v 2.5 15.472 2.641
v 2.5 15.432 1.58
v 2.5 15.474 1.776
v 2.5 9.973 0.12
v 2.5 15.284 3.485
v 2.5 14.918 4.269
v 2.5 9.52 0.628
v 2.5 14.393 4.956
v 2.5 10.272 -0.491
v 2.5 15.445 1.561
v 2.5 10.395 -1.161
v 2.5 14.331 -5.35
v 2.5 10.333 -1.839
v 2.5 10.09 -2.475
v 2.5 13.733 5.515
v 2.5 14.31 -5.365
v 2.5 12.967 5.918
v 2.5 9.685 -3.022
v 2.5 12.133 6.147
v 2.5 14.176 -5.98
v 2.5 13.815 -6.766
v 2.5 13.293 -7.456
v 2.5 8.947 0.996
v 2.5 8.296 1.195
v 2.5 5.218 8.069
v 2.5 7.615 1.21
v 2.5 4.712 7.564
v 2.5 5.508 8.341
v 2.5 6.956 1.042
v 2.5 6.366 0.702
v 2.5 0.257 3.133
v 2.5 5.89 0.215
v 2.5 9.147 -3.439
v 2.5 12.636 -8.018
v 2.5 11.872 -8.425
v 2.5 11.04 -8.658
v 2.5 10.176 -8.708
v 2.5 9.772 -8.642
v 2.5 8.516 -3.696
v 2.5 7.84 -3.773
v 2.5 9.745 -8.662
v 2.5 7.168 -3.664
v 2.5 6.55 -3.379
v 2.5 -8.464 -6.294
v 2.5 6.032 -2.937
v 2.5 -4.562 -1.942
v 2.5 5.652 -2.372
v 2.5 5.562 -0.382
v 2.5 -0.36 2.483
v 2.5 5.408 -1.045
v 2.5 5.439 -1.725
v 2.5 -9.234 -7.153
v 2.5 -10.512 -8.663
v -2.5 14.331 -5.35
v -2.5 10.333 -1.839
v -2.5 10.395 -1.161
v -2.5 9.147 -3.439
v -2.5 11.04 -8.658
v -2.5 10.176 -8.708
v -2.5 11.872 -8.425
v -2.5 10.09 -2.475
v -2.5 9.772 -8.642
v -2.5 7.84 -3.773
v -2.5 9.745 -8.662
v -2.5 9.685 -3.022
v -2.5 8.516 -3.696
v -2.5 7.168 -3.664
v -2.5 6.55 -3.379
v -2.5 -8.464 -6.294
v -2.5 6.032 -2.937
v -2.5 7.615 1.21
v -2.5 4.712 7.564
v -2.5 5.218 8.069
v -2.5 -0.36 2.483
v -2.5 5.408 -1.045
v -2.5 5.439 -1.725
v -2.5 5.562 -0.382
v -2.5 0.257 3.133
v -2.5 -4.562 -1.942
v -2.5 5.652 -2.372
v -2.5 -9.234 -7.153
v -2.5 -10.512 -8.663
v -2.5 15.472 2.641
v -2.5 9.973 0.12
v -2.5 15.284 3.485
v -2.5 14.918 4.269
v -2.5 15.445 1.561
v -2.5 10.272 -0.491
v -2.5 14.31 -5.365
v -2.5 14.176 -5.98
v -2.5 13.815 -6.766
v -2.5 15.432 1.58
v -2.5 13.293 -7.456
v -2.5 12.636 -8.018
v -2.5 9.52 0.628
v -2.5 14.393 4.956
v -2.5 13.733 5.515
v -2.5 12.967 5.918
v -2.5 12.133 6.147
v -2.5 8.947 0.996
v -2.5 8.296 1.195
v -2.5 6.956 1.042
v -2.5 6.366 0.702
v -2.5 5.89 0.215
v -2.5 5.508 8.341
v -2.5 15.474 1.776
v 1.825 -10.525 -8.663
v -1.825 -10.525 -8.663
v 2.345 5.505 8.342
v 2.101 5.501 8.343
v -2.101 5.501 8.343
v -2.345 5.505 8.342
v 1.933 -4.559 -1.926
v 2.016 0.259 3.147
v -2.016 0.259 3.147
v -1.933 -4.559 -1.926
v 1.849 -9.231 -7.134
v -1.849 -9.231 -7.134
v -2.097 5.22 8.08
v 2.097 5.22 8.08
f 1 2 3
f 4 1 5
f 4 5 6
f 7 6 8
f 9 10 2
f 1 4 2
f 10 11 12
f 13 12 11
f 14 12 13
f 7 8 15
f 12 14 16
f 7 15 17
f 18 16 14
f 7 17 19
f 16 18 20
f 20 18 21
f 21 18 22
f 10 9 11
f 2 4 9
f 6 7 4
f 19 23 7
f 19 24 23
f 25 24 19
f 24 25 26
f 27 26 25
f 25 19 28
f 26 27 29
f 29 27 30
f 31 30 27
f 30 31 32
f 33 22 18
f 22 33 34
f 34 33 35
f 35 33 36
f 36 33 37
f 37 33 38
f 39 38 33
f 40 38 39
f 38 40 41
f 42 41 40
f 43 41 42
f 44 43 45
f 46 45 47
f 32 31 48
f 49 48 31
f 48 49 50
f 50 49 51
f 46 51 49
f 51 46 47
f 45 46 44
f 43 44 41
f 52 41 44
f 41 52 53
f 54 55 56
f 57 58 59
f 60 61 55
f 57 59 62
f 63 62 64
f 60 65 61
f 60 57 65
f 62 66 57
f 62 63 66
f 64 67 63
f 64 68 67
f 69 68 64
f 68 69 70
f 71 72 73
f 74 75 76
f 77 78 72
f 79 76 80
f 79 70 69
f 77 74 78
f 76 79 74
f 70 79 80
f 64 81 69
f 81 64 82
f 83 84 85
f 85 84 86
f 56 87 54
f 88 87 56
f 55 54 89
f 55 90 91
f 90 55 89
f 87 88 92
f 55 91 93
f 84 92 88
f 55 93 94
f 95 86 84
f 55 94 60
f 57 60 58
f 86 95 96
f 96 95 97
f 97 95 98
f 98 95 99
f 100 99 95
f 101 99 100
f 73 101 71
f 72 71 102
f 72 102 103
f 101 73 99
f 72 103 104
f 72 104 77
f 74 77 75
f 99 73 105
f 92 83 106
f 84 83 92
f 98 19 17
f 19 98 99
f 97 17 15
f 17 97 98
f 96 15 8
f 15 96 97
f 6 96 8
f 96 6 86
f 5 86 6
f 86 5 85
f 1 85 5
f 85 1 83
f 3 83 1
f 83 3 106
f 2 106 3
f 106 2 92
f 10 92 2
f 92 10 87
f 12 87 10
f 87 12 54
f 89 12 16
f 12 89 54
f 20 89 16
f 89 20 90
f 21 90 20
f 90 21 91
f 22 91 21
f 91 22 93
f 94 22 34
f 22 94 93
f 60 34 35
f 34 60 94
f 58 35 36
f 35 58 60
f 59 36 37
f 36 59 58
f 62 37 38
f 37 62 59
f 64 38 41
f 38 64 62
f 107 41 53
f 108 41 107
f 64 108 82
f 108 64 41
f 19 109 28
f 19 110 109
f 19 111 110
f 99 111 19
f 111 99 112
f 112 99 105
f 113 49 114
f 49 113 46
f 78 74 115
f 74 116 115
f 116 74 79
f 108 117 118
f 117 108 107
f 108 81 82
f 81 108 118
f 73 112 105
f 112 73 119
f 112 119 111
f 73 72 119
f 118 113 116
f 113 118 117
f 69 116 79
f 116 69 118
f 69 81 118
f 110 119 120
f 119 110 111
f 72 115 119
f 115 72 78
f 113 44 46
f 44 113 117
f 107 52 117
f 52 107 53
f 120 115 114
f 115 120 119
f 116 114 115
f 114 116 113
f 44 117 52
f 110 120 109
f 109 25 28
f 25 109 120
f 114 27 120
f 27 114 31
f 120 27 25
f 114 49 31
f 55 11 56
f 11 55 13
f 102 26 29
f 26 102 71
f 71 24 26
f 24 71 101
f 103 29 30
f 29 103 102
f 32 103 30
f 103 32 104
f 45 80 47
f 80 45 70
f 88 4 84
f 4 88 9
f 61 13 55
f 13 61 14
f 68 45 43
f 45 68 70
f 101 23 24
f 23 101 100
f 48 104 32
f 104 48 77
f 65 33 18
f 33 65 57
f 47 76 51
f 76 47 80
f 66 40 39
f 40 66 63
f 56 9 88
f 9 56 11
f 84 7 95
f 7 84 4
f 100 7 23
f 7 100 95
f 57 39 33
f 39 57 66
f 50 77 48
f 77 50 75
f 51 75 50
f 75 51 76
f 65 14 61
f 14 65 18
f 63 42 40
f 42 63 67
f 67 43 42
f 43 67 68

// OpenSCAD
// file: ../motors/MN5212.scad
use <../utils.scad>

module MN5212(){

	//render(){
		difference(){
			union(){
				translate([0,0, 42.5 / 2 - 23 / 2 - 4.9 - 6])
					cylinder(
						h = 23,
						r = 59 / 2,
						$fa = fa(59 / 2),
						center = true);
				translate([0,0, 42.5 / 2 - 4.9 / 2 - 6])
					cylinder(
						h = 4.9,
						r1 = 59 / 2,
						r2 = 24.8 / 2,
						$fa = fa(59 / 2),
						center = true);
				translate([0,0, - 42.5 / 2 + 5.6 / 2 + 3])
					cylinder(
						h = 5.6,
						r1 = 44 / 2,
						r2 = 59 / 2,
						$fa = fa(59 / 2),
						center = true);
				translate([0, 0, 42.5 / 2 - 3])
					cylinder(
						h = 6,
						r = 4 / 2,
						$fa = fa(4 / 2),
						center = true);
				translate([0, 0, - 42.5 / 2 + 1.5])
					cylinder(
						h = 3,
						r = 6 / 2,
						$fa = fa(6 / 2),
						center = true);
			}
			union(){
				for(i = [0:90:270])
					rotate([0, 0, i])
						translate([0, 25 / 2, -16.25 - 0.025])
							cylinder(
								h = 4,
								r = 3 / 2,
								$fa = fa(3 / 2),
								center = true);
				for(i = [0:120:240])
					rotate([0, 0, i])
						translate([0, 17 / 2, 12.75 + 0.025])
							cylinder(
								h = 5,
								r = 3 / 2,
								$fa = fa(3 / 2),
								center = true);
				rotate([0, 0, 30])
					translate([0, 12 / 2, 12.75 + 0.025])
						cylinder(
							h = 5,
							r = 3 / 2,
							$fa = fa(3 / 2),
							center = true);
				rotate([0, 0, 30 + 180])
					translate([0, 12 / 2, 12.75 + 0.025])
						cylinder(
							h = 5,
							r = 3 / 2,
							$fa = fa(3 / 2),
							center = true);
			}
		}

	//}

}

MN5212();
// file: ../servos/TGY_4805_2PA.scad
use <../utils.scad>

module TGY_4805_2PA(){

	length = 40;
	width = 20;
	depth = 36.4;
	wing_width = 58;
	wing_thick = 2.45;
	wing_height = 27.7;
	shaft_offset = 9.5;
	hole_seperation = 9.2;
	hole_spacing = 50;
	shaft_height = 40;
	shaft_length = 3.6;
	hole_diameter = 4.8;

	module mounting_hole(){
		mh_rad = hole_diameter / 2;
		translate(
			[
				hole_spacing / 2,
				0,
				-depth / 2 + wing_height - wing_thick / 2
			])
			cylinder(h = 5, r = mh_rad, $fa = fa(mh_rad), center = true);
	}

	difference(){
		union(){
			cube([length, width, depth], center = true);
			translate([0, 0, -depth / 2 + wing_height - wing_thick / 2])
				cube([wing_width, width, wing_thick], center = true);
			translate(
				[
					- length / 2 + shaft_offset,
					0,
					shaft_height - length / 2 + shaft_length / 2
				])
				cylinder(
					h = shaft_length,
					r = 1.5,
					$fa = fa(1.5),
					center = true);
		}	union(){

			translate([0, hole_seperation / 2, 0]){
				mounting_hole();
				mirror() mounting_hole();
			}
			translate([0, -hole_seperation / 2, 0]){
				mounting_hole();
				mirror() mounting_hole();
			}
		}
	}
}

module TGY_4805_2PA_translate(){
	length = 40;
	shaft_offset = 9.5;
	shaft_height = 40;
	shaft_length = 3.6;
	translate(
		[
				- length / 2 + shaft_offset,
				0,
				shaft_height - length / 2 + shaft_length / 2
		]) children();
}

TGY_4805_2PA();
// file: ../servos/HS_5065MG.scad
use <../utils.scad>

module HS_5065MG(){

	length = 23.75;
	width = 11.68;
	depth = 20.32;
	wing_width = 32.38;
	wing_thick = 2;
	wing_offset = 1;
	shaft_offset = 6;
	hole_spacing = 28.32;
	hole_spacing_2 = 27;
	hole_2_wide = 6;
	hole_diameter = 2;
	shaft_height = 26.16;
	shaft_length = 2;

	module mounting_hole(){
		mh_rad = hole_diameter / 2;
		translate(
			[
				hole_spacing / 2,
				0,
				depth / 2 - wing_thick / 2
			])
			cylinder(h = 5, r = mh_rad, $fa = fa(mh_rad), center = true);
		translate(
			[
				hole_spacing_2 / 2,
				hole_2_wide / 2,
				depth / 2 - wing_thick / 2
			])
			cylinder(h = 5, r = mh_rad, $fa = fa(mh_rad), center = true);
		translate(
			[
				hole_spacing_2 / 2,
				- hole_2_wide / 2,
				depth / 2 - wing_thick / 2
			])
			cylinder(h = 5, r = mh_rad, $fa = fa(mh_rad), center = true);
	}

	difference(){
		union(){
			cube([length, width, depth], center = true);
			translate([0, 0, depth / 2 - wing_thick / 2 - wing_offset])
				cube([wing_width, width, wing_thick], center = true);
			translate(
				[
					- length / 2 + shaft_offset,
					0,
					depth / 2 + 3.8 + 1.9 + shaft_length / 2
				])
				cylinder(
					h = shaft_length,
					r = 1.5,
					$fa = fa(1.5),
					center = true);
			translate(
				[
					- length / 2 + shaft_offset,
					0,
					depth / 2 + 3.8 / 2
				])
				cylinder(
					h = 3.8,
					r = 11.3 / 2,
					$fa = fa(11.3 / 2),
					center = true);
			translate(
				[
					- length / 2 + shaft_offset,
					0,
					depth / 2 + 3.8 + 1.9 / 2
				])
				cylinder(
					h = 1.9,
					r1 = 11.3 / 2,
					r2 = 8 / 2,
					$fa = fa(11.3 / 2),
					center = true);
		}	union(){

			mounting_hole();
			mirror() mounting_hole();
		}
	}
}

module HS_5065MG_arm(){

	hole_size = 1.5;
	hole_spacing = 3;
	hole_offset = 9.6;

	difference(){
		union(){
			translate([0, 0, 4.4 / 2])
				cylinder(
					h = 4.4,
					r = 8 / 2,
					$fa = fa(8 / 2),
					center = true);
			hull(){
				translate([0, 0, 4.4 - 1.8 / 2])
					cylinder(
						h = 1.8,
						r = 8 / 2,
						$fa = fa(8 / 2),
						center = true);
				translate([18.8, 0, 4.4 - 1.8 / 2])
					cylinder(
						h = 1.8,
						r = 5 / 2,
						$fa = fa(5 / 2),
						center = true);
			}
		}
		union(){
			for(i = [0:3]){
				translate([hole_offset + hole_spacing * i, 0, 4.4 - 1.8 / 2])
					cylinder(
						h = 5,
						r = hole_size / 2,
						$fa = fa(hole_size / 2),
						center = true);
			}
		}
	}
}

module HS_5065MG_shaft_translate(){
	translate(
		[
			- 23.75 / 2 + 6,
			0,
			20.32 / 2 + 3.8 + 1.9
		])
			children();
}

HS_5065MG();
HS_5065MG_shaft_translate() HS_5065MG_arm();
// file: ../servos/LS_0006_servo.scad
// Author Michael Marques (DrYerzinia)

use <../utils.scad>

module ls_0006_servo(){
	
	length = 21.4;
	depth = 19.9;
	thickness = 11.65;

	gear_height = 2.6;
	gear_bump_height = 0.7;
	gear_bump_diameter = 1.97;
	gear_outer_bump_diameter = 6;
	gear_bump_offset = 12.2;

	shaft_height = 2.4;
	shaft_diameter = 3.74;
	shaft_offset = thickness / 2;
	shaft_screw_diameter = 1.3;
	
	wing_outer_width = 8.5;
	wing_top_off = 3.8;
	wing_length = 3.8;
	wing_thickness = 1.2;
	wing_hole_diameter = 1.85;
	wing_hole_edge_dist = 2;

	module wing_hole(){
		translate(
			[
				length / 2 + wing_hole_edge_dist,
				0,
				depth/2 - wing_top_off - wing_thickness / 2
			])
			cylinder(
				h = wing_thickness + 1,
				r = wing_hole_diameter / 2,
				$fn = 16,
				center = true);
	}

	module wing(){
		translate(
			[
				length / 2,
				thickness / 2,
				depth/2 - wing_top_off - wing_thickness
			])
			rotate([0,0,-90])
				trapezoid(
					thickness,
					wing_outer_width,
					wing_length,
					wing_thickness);
	}

	// Body
	cube([length, thickness, depth], center = true);

	difference(){
		union(){

			wing();
			mirror() wing();

			// Gear Bumps
			translate([0, 0, depth/2 + gear_height / 2]){
				translate([length / 2 - gear_bump_offset, 0, 0])
					cylinder(
						h = gear_height,
						r = gear_outer_bump_diameter / 2,
						$fn = 16,
						center = true);
				translate([length / 2 - gear_bump_offset, 0, gear_height/2 + gear_bump_height / 2])
					cylinder(
						h = gear_bump_height,
						r = gear_bump_diameter / 2,
						$fn = 16,
						center = true);
				translate([length / 2 - shaft_offset, 0, 0])
					cylinder(
						h = gear_height,
						r = thickness / 2,
						$fn = 32,
						center = true);
				// Shaft
				translate([length / 2 - shaft_offset, 0, gear_height])
					cylinder(
						h = shaft_height,
						r = shaft_diameter / 2,
						$fn = 16,
						center = true);
			}

		}
		union(){

			wing_hole();
			mirror() wing_hole();

			// Shaft_hole
			translate(
				[
					length / 2 - shaft_offset,
					0,
					depth/2 + gear_height * (3 / 2) + 0.5])
				cylinder(
					h = shaft_height + 1,
					r = shaft_screw_diameter / 2,
					$fn = 16,
					center = true);

		}
	}

}

module translate_ls_0006_attachment(){

	length = 21.4;
	thickness = 11.65;
	shaft_offset = thickness / 2;
	depth = 19.9;
	float = 3.3;

	translate([length / 2 - shaft_offset, 0, depth / 2 + float])
		children();

}

module bar_attachment(){

	height = 3.75;
	bar_length = 14.7;
	bar_thickness = 1.6;
	inner_radius = 5.9;
	outer_radius = 3.95;
	shaft_diameter = 3.7;
	upper_void_diameter = 4.8;
	screw_diameter = 2;
	hole_spacing = 2;
	hole_4_diameter = 1.2;
	hole_diameter = 1;
	hole_start_off = 4.7;
	top_void_depth = 0.67;
	bottom_void_depth = 1.84;

	translate([0, 0, height / 2]){
		difference(){
			union(){

				translate([0, inner_radius / 2, height / 2 - bar_thickness])
					rotate([0,0,-90])
						trapezoid(
							inner_radius,
							outer_radius,
							bar_length,
							bar_thickness);

				cylinder(
					h = height,
					r = inner_radius / 2,
					$fn = 16,
					center = true);

				translate([bar_length, 0, height / 2 - bar_thickness / 2])
					cylinder(
						h = bar_thickness,
						r = outer_radius / 2,
						$fn = 16,
						center = true);

			}
			union(){
				// screwhole
				cylinder(
					h = height + 1,
					r = screw_diameter / 2,
					$fn = 16,
					center = true);
				// voids
				translate([0, 0, height / 2 - top_void_depth / 2 + 0.5])
					cylinder(
						h = top_void_depth + 1,
						r = upper_void_diameter / 2,
						$fn = 16,
						center = true);
				translate([0, 0,  - bottom_void_depth / 2 - 0.5])
					cylinder(
						h = bottom_void_depth + 1,
						r = shaft_diameter / 2,
						$fn = 16,
						center = true);

				for(i = [0:4]){
					dia = (i != 3) ? hole_diameter : hole_4_diameter;
					translate(
						[
							hole_start_off + hole_spacing * i,
							0,
							height / 2 - bar_thickness / 2])
						cylinder(
							h = bar_thickness + 1,
							r = dia / 2,
							$fn = 16,
							center = true);
				}

			}
		}
	}

}

ls_0006_servo();
translate_ls_0006_attachment() bar_attachment();
// file: ../servos/parallax_continuous_rotation_servo.scad
// Author Michael Marques (DrYerzinia)

module parallax_continuous_rotation_servo(){

	depth = 37.7;
	length = 40.75;
	width = 19.75;

	mount_height = 2.7;
	mount_extent = 6.1;
	mount_from_top = 7.7;

	mount_hole_diameter = 4.46;
	mount_hole_spacing = 14.4 - mount_hole_diameter;

	shaft_diameter = 5.8;
	shaft_offset = 10;
	shaft_length = 3.5;

	module mounting_hole(){

			translate(
				[
					length / 2 + 5,
					mount_hole_spacing / 2,
					depth / 2 - mount_height / 2 - mount_from_top
				]
				)
				cylinder(
					h = mount_height + 1,
					r = mount_hole_diameter / 2,
					$fn=16,
					center = true);
	}

	difference(){
		union(){

			// Body
			cube([length,width,depth], center = true);

			// Mounting wings
			translate(
				[
					0,
					0,
					depth / 2 - mount_height / 2 - mount_from_top
				])
				cube(
					[
						length + mount_extent * 2,
						width,
						mount_height
					],
					center = true);

			// Shaft
			translate(
				[
					length / 2 - shaft_offset,
					0,
					depth / 2 + shaft_length / 2
				]
				)
				cylinder(
					h = shaft_length,
					r = shaft_diameter / 2,
					$fn = 16,
					center = true
				);

		}
		union(){

			// Mounting Holes
			mounting_hole();
			mirror()
				mounting_hole();

			translate([0,-mount_hole_spacing,0]){
				mounting_hole();
				mirror()
					mounting_hole();
			}
		}
	}

}

module translate_shaft(){

	depth = 37.7;
	length = 40.75;

	shaft_offset = 10;

	translate(
		[
			length / 2 - shaft_offset,
			0,
			depth / 2
		])
		children();
}

module round_servo_attachment(){

	height = 6;
	diameter = 20.8;
	inner_diameter = 8.6;
	plate_thickness = 2.45;

	float = 2;

	depth = 37.7;
	length = 40.75;

	shaft_offset = 10;

	plate_hole_spacing = 14.5;
	plate_hole_diameter = 1.4;
	plate_hole_minor_spacing = 3.5;

	screw_hole_diameter = 3;

	inner_diameter = 8;
	
	top_depth = 1.8;
	bottom_depth = 3.4;

	void_diameter = 5.8;

	module plate_hole(){
		cylinder(
			h = plate_thickness + 1,
			r = plate_hole_diameter / 2,
			$fn = 16,
			center = true
		);
	}

	module plate_hole_group(){
		translate([0, 0, height / 2 - plate_thickness / 2]){
			translate([0, plate_hole_spacing / 2, 0]){
					plate_hole();
					translate([- plate_hole_minor_spacing, 0, 0])
						plate_hole();
					translate([  plate_hole_minor_spacing, 0, 0])
						plate_hole();
			}
		}
	}

	translate(
		[
			length / 2 - shaft_offset,
			0,
			depth / 2 + height / 2 + float
		]
		)
		difference(){

			union(){

				// inner shaft
				cylinder(
					h = height,
					r = inner_diameter / 2,
					$fn = 16,
					center = true
				);

				// top
				translate([0, 0, height / 2 - plate_thickness / 2])
					cylinder(
						h = plate_thickness,
						r = diameter / 2,
						$fn = 32,
						center = true
					);
			}

			union(){

				// plate holes
				for(ang = [0:3]){
					rotate([0,0, ang * 90])
						plate_hole_group();
				}

				// screw hole
				cylinder(
					h = height + 1,
					r = screw_hole_diameter / 2,
					$fn = 16,
					center = true
				);

				// inner voids
				translate([0, 0, height / 2 - top_depth / 2 + 1])
					cylinder(
						h = top_depth + 1,
						r = void_diameter / 2,
						$fn = 16,
						center = true
					);
				translate([0, 0, -1])
					cylinder(
						h = bottom_depth + 1,
						r = void_diameter / 2,
						$fn = 16,
						center = true
					);

			}

		}

}

parallax_continuous_rotation_servo();
round_servo_attachment();
// file: ../hardware.scad
 // Author Michael Marques (DrYerzinia)

// http://www.ebay.com/itm/10-PCS-683-3x7x2-mm-Metal-OPEN-PRECISION-Miniature-Ball-Bearing-3-7-2-/291206307942?hash=item43cd3fa066:m:mCi6eovrGVk_CjIUjlhw8yg
// E-Bay empire.rc

module washer_M3_7x3_2x0_5mm(){

	difference(){
		cylinder(
			h = 0.5,
			r = 7 / 2,
			$fn = 16,
			center = true);
		cylinder(
			h = 0.5 + 0.1,
			r = 3.2 / 2,
			$fn = 16,
			center = true);
	}

}

module bearing_3x7x2mm(){

	difference(){
		cylinder(
			h = 2,
			r = 7 / 2,
			$fn = 16,
			center = true);
		cylinder(
			h = 2 + 1,
			r = 3 / 2,
			$fn = 16,
			center = true);
	}

}

module bearing_5x8x2_5mm(){

	difference(){
		cylinder(
			h = 2.5,
			r = 8 / 2,
			$fn = 16,
			center = true);
		cylinder(
			h = 2.5 + 1,
			r = 5 / 2,
			$fn = 16,
			center = true);
	}

}

module bearing_8x16x5mm(){

	difference(){
		cylinder(
			h = 5,
			r = 16 / 2,
			$fn = 16,
			center = true);
		cylinder(
			h = 5 + 1,
			r = 8 / 2,
			$fn = 16,
			center = true);
	}

}


bearing_5x8x2_5mm();
// file: ../utils.scad
// http://forum.openscad.org/Creating-pie-pizza-slice-shape-need-a-dynamic-length-array-td3148.html

module pie_slice(r, start_angle, end_angle) {
    R = r * sqrt(2) + 1;
    a0 = (4 * start_angle + 0 * end_angle) / 4;
    a1 = (3 * start_angle + 1 * end_angle) / 4;
    a2 = (2 * start_angle + 2 * end_angle) / 4;
    a3 = (1 * start_angle + 3 * end_angle) / 4;
    a4 = (0 * start_angle + 4 * end_angle) / 4;
    if(end_angle > start_angle)
        intersection() {
        circle(r, $fa = fa(r));
        polygon([
            [0,0],
            [R * cos(a0), R * sin(a0)],
            [R * cos(a1), R * sin(a1)],
            [R * cos(a2), R * sin(a2)],
            [R * cos(a3), R * sin(a3)],
            [R * cos(a4), R * sin(a4)],
            [0,0]
       ]);
    }
}

// https://github.com/openscad/openscad/issues/29

module rotate_about(v,a) {
	translate(v) rotate(a) translate(-v) children();
}

module rotate_about_axis(v, ang, axis) {
	translate(v) rotate(ang, axis) translate(-v) children();
}

// https://github.com/robofun/openscad-utils/blob/master/trapezoid.scad

module trapezoid(width_base, width_top, height, thickness){

  linear_extrude(height = thickness)
			polygon(
				points =
					[
						[0,0],
						[width_base,0],
						[width_base-(width_base-width_top)/2,height],
						[(width_base-width_top)/2,height]
					],
					paths=[[0,1,2,3]]); 
  
}

// http://forum.openscad.org/fe-Tolerance-based-arc-approximation-td14212.html

function fa(r)=($fn>0)?360/$fn:($fe>0)?($fe<r)?min(45,2*acos(1-$fe/r)):45:$fa; 
// file: ../render_settings.scad
// Author Michael Marques (DrYerzinia)

// Lulzbot Mini tolerances
// x/y 0.1mm
// z   0.05mm
//
// 0.1mm   preview tolerance
// 0.025mm export  tolerance

$fs = 0.01;
$fn = undef;
$fa = 360 / 5;

$fe = 0.025;	// export
// main file
// Author Michael Marques (DrYerzinia)

include <../render_settings.scad>

use <../BB8.scad>

rotate([80.84, 0, 0])
translate([0, -138, -200])
	rotate([0, 0, 45])
	Door_P40();
